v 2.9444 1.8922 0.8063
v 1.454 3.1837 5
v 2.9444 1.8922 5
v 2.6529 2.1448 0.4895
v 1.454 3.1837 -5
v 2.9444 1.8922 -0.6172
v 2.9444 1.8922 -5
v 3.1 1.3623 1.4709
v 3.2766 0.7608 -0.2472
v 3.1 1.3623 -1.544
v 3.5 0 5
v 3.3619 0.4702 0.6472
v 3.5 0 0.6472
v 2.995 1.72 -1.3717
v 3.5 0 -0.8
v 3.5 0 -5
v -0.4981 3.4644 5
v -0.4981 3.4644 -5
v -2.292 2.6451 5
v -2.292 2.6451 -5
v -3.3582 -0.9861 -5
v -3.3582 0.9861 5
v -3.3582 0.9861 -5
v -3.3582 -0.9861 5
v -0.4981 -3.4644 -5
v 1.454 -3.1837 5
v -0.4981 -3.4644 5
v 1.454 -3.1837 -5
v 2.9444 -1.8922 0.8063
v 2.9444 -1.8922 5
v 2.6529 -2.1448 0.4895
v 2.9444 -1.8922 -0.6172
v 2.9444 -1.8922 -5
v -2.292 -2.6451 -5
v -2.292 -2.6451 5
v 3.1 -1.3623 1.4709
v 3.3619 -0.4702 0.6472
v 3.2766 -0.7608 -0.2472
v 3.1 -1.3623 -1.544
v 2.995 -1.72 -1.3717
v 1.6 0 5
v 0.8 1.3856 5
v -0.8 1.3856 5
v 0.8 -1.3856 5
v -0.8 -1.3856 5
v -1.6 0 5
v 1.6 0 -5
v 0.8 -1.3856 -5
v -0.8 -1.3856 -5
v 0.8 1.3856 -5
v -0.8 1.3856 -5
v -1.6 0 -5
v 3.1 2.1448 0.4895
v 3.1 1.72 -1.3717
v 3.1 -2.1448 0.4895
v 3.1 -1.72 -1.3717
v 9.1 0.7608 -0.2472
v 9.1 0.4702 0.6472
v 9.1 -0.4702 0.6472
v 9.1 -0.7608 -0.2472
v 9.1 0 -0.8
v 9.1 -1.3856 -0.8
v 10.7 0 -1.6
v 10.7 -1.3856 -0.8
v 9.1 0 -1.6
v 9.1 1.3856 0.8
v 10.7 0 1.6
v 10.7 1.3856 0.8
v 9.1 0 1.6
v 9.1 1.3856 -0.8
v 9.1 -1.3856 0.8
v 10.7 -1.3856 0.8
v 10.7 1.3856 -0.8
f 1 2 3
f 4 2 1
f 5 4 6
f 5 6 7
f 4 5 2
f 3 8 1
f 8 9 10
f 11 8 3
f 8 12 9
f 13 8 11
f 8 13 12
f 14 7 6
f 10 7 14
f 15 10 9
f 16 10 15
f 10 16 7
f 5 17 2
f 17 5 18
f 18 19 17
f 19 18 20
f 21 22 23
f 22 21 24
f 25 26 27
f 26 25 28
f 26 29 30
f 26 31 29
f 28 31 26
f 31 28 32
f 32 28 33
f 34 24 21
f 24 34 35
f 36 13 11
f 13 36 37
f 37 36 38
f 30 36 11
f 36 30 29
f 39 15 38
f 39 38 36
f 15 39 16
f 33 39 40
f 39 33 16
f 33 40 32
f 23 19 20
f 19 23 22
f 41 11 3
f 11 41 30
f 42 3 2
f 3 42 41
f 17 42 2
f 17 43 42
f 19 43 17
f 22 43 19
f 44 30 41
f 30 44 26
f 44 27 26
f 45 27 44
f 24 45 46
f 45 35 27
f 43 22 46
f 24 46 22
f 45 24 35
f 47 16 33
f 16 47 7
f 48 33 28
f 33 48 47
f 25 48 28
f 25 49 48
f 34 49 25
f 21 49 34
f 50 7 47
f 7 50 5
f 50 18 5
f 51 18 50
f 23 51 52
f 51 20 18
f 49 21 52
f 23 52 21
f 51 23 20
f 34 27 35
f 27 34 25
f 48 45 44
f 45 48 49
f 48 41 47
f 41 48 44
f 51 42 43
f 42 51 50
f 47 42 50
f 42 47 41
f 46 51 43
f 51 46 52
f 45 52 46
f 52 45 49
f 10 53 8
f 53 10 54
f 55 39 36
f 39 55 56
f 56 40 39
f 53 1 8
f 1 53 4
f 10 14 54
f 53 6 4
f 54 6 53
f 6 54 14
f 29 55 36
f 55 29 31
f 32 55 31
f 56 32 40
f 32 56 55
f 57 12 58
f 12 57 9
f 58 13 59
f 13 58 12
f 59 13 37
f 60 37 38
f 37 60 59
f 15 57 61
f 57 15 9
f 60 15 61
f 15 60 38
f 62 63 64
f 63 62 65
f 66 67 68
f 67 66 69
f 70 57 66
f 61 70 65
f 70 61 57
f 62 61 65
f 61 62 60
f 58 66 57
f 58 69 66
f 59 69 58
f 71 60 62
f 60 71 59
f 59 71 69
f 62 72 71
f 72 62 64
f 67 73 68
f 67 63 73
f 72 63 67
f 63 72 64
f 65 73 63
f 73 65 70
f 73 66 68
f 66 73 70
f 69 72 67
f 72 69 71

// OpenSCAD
// Parameters
bore_diameter_mm = 3.0; //[1.5:6.0:0.1]
outer_diameter_mm = 7.0; //[3.5:14.0:0.1]
length_mm = 10.0; //[5.0:20.0:0.1]
bore_radius_mm = 1.5; //[0.75:3.0:0.05]
outer_radius_mm = 3.5; //[1.75:7.0:0.05]
casing_thickness_mm = 0.7; //[0.4:1.4:0.05]
bore_clearance_mm = 0.1; //[0.0:0.3:0.01]
overlap_mm = 1.0; //[0.5:2.0:0.1]
screw_shank_radius_mm = 0.8; //[0.5:1.6:0.05]
screw_length_mm = 8.0; //[4.0:16.0:0.5]
screw_head_radius_mm = 1.6; //[1.0:3.2:0.05]
screw_head_height_mm = 1.6; //[0.8:3.2:0.05]
washer_radius_mm = 2.2; //[1.5:4.4:0.05]
washer_thickness_mm = 0.6; //[0.3:1.2:0.05]

// Linear Bearing (LM3UU) - complete geometry (single solid with bore)
module linear_bearing() {
  color([0.85, 0.85, 0.8])
  difference() {
    // Outer body
    cylinder(r=outer_radius_mm, h=length_mm, center=true);

    // Through bore (slightly longer to guarantee cut)
    cylinder(r=bore_radius_mm + bore_clearance_mm,
             h=length_mm + 2*overlap_mm, center=true);
  }
}

// Screw and Washer - positioned to INTERSECT the bearing by overlap_mm
module screw_and_washer() {
  // Bearing OD in +X is at x = +outer_radius_mm.
  // Place washer so its inner face is inside the bearing by overlap_mm.
  washer_center_x = outer_radius_mm + washer_thickness_mm/2 - overlap_mm;

  // Place shank so its left face is inside the washer by overlap_mm.
  shank_center_x  = (washer_center_x + washer_thickness_mm/2) + screw_length_mm/2 - overlap_mm;

  // Place head so its left face is inside the shank by overlap_mm.
  head_center_x   = (shank_center_x + screw_length_mm/2) + screw_head_height_mm/2 - overlap_mm;

  color("Silver")
  union() {
    // Washer
    translate([washer_center_x, 0, 0])
      rotate([0, 90, 0])
        cylinder(r=washer_radius_mm, h=washer_thickness_mm, center=true);

    // Screw shank
    translate([shank_center_x, 0, 0])
      rotate([0, 90, 0])
        cylinder(r=screw_shank_radius_mm, h=screw_length_mm, center=true);

    // Screw head
    translate([head_center_x, 0, 0])
      rotate([0, 90, 0])
        cylinder(r=screw_head_radius_mm, h=screw_head_height_mm, center=true);
  }
}

// Assembly: ensure everything is one connected solid and includes the missing linear bearing
module assembly() {
  union() {
    linear_bearing();     // REQUIRED: linear bearing present
    screw_and_washer();   // Intersects bearing/washer/shank/head by overlap_mm
  }
}

assembly();
